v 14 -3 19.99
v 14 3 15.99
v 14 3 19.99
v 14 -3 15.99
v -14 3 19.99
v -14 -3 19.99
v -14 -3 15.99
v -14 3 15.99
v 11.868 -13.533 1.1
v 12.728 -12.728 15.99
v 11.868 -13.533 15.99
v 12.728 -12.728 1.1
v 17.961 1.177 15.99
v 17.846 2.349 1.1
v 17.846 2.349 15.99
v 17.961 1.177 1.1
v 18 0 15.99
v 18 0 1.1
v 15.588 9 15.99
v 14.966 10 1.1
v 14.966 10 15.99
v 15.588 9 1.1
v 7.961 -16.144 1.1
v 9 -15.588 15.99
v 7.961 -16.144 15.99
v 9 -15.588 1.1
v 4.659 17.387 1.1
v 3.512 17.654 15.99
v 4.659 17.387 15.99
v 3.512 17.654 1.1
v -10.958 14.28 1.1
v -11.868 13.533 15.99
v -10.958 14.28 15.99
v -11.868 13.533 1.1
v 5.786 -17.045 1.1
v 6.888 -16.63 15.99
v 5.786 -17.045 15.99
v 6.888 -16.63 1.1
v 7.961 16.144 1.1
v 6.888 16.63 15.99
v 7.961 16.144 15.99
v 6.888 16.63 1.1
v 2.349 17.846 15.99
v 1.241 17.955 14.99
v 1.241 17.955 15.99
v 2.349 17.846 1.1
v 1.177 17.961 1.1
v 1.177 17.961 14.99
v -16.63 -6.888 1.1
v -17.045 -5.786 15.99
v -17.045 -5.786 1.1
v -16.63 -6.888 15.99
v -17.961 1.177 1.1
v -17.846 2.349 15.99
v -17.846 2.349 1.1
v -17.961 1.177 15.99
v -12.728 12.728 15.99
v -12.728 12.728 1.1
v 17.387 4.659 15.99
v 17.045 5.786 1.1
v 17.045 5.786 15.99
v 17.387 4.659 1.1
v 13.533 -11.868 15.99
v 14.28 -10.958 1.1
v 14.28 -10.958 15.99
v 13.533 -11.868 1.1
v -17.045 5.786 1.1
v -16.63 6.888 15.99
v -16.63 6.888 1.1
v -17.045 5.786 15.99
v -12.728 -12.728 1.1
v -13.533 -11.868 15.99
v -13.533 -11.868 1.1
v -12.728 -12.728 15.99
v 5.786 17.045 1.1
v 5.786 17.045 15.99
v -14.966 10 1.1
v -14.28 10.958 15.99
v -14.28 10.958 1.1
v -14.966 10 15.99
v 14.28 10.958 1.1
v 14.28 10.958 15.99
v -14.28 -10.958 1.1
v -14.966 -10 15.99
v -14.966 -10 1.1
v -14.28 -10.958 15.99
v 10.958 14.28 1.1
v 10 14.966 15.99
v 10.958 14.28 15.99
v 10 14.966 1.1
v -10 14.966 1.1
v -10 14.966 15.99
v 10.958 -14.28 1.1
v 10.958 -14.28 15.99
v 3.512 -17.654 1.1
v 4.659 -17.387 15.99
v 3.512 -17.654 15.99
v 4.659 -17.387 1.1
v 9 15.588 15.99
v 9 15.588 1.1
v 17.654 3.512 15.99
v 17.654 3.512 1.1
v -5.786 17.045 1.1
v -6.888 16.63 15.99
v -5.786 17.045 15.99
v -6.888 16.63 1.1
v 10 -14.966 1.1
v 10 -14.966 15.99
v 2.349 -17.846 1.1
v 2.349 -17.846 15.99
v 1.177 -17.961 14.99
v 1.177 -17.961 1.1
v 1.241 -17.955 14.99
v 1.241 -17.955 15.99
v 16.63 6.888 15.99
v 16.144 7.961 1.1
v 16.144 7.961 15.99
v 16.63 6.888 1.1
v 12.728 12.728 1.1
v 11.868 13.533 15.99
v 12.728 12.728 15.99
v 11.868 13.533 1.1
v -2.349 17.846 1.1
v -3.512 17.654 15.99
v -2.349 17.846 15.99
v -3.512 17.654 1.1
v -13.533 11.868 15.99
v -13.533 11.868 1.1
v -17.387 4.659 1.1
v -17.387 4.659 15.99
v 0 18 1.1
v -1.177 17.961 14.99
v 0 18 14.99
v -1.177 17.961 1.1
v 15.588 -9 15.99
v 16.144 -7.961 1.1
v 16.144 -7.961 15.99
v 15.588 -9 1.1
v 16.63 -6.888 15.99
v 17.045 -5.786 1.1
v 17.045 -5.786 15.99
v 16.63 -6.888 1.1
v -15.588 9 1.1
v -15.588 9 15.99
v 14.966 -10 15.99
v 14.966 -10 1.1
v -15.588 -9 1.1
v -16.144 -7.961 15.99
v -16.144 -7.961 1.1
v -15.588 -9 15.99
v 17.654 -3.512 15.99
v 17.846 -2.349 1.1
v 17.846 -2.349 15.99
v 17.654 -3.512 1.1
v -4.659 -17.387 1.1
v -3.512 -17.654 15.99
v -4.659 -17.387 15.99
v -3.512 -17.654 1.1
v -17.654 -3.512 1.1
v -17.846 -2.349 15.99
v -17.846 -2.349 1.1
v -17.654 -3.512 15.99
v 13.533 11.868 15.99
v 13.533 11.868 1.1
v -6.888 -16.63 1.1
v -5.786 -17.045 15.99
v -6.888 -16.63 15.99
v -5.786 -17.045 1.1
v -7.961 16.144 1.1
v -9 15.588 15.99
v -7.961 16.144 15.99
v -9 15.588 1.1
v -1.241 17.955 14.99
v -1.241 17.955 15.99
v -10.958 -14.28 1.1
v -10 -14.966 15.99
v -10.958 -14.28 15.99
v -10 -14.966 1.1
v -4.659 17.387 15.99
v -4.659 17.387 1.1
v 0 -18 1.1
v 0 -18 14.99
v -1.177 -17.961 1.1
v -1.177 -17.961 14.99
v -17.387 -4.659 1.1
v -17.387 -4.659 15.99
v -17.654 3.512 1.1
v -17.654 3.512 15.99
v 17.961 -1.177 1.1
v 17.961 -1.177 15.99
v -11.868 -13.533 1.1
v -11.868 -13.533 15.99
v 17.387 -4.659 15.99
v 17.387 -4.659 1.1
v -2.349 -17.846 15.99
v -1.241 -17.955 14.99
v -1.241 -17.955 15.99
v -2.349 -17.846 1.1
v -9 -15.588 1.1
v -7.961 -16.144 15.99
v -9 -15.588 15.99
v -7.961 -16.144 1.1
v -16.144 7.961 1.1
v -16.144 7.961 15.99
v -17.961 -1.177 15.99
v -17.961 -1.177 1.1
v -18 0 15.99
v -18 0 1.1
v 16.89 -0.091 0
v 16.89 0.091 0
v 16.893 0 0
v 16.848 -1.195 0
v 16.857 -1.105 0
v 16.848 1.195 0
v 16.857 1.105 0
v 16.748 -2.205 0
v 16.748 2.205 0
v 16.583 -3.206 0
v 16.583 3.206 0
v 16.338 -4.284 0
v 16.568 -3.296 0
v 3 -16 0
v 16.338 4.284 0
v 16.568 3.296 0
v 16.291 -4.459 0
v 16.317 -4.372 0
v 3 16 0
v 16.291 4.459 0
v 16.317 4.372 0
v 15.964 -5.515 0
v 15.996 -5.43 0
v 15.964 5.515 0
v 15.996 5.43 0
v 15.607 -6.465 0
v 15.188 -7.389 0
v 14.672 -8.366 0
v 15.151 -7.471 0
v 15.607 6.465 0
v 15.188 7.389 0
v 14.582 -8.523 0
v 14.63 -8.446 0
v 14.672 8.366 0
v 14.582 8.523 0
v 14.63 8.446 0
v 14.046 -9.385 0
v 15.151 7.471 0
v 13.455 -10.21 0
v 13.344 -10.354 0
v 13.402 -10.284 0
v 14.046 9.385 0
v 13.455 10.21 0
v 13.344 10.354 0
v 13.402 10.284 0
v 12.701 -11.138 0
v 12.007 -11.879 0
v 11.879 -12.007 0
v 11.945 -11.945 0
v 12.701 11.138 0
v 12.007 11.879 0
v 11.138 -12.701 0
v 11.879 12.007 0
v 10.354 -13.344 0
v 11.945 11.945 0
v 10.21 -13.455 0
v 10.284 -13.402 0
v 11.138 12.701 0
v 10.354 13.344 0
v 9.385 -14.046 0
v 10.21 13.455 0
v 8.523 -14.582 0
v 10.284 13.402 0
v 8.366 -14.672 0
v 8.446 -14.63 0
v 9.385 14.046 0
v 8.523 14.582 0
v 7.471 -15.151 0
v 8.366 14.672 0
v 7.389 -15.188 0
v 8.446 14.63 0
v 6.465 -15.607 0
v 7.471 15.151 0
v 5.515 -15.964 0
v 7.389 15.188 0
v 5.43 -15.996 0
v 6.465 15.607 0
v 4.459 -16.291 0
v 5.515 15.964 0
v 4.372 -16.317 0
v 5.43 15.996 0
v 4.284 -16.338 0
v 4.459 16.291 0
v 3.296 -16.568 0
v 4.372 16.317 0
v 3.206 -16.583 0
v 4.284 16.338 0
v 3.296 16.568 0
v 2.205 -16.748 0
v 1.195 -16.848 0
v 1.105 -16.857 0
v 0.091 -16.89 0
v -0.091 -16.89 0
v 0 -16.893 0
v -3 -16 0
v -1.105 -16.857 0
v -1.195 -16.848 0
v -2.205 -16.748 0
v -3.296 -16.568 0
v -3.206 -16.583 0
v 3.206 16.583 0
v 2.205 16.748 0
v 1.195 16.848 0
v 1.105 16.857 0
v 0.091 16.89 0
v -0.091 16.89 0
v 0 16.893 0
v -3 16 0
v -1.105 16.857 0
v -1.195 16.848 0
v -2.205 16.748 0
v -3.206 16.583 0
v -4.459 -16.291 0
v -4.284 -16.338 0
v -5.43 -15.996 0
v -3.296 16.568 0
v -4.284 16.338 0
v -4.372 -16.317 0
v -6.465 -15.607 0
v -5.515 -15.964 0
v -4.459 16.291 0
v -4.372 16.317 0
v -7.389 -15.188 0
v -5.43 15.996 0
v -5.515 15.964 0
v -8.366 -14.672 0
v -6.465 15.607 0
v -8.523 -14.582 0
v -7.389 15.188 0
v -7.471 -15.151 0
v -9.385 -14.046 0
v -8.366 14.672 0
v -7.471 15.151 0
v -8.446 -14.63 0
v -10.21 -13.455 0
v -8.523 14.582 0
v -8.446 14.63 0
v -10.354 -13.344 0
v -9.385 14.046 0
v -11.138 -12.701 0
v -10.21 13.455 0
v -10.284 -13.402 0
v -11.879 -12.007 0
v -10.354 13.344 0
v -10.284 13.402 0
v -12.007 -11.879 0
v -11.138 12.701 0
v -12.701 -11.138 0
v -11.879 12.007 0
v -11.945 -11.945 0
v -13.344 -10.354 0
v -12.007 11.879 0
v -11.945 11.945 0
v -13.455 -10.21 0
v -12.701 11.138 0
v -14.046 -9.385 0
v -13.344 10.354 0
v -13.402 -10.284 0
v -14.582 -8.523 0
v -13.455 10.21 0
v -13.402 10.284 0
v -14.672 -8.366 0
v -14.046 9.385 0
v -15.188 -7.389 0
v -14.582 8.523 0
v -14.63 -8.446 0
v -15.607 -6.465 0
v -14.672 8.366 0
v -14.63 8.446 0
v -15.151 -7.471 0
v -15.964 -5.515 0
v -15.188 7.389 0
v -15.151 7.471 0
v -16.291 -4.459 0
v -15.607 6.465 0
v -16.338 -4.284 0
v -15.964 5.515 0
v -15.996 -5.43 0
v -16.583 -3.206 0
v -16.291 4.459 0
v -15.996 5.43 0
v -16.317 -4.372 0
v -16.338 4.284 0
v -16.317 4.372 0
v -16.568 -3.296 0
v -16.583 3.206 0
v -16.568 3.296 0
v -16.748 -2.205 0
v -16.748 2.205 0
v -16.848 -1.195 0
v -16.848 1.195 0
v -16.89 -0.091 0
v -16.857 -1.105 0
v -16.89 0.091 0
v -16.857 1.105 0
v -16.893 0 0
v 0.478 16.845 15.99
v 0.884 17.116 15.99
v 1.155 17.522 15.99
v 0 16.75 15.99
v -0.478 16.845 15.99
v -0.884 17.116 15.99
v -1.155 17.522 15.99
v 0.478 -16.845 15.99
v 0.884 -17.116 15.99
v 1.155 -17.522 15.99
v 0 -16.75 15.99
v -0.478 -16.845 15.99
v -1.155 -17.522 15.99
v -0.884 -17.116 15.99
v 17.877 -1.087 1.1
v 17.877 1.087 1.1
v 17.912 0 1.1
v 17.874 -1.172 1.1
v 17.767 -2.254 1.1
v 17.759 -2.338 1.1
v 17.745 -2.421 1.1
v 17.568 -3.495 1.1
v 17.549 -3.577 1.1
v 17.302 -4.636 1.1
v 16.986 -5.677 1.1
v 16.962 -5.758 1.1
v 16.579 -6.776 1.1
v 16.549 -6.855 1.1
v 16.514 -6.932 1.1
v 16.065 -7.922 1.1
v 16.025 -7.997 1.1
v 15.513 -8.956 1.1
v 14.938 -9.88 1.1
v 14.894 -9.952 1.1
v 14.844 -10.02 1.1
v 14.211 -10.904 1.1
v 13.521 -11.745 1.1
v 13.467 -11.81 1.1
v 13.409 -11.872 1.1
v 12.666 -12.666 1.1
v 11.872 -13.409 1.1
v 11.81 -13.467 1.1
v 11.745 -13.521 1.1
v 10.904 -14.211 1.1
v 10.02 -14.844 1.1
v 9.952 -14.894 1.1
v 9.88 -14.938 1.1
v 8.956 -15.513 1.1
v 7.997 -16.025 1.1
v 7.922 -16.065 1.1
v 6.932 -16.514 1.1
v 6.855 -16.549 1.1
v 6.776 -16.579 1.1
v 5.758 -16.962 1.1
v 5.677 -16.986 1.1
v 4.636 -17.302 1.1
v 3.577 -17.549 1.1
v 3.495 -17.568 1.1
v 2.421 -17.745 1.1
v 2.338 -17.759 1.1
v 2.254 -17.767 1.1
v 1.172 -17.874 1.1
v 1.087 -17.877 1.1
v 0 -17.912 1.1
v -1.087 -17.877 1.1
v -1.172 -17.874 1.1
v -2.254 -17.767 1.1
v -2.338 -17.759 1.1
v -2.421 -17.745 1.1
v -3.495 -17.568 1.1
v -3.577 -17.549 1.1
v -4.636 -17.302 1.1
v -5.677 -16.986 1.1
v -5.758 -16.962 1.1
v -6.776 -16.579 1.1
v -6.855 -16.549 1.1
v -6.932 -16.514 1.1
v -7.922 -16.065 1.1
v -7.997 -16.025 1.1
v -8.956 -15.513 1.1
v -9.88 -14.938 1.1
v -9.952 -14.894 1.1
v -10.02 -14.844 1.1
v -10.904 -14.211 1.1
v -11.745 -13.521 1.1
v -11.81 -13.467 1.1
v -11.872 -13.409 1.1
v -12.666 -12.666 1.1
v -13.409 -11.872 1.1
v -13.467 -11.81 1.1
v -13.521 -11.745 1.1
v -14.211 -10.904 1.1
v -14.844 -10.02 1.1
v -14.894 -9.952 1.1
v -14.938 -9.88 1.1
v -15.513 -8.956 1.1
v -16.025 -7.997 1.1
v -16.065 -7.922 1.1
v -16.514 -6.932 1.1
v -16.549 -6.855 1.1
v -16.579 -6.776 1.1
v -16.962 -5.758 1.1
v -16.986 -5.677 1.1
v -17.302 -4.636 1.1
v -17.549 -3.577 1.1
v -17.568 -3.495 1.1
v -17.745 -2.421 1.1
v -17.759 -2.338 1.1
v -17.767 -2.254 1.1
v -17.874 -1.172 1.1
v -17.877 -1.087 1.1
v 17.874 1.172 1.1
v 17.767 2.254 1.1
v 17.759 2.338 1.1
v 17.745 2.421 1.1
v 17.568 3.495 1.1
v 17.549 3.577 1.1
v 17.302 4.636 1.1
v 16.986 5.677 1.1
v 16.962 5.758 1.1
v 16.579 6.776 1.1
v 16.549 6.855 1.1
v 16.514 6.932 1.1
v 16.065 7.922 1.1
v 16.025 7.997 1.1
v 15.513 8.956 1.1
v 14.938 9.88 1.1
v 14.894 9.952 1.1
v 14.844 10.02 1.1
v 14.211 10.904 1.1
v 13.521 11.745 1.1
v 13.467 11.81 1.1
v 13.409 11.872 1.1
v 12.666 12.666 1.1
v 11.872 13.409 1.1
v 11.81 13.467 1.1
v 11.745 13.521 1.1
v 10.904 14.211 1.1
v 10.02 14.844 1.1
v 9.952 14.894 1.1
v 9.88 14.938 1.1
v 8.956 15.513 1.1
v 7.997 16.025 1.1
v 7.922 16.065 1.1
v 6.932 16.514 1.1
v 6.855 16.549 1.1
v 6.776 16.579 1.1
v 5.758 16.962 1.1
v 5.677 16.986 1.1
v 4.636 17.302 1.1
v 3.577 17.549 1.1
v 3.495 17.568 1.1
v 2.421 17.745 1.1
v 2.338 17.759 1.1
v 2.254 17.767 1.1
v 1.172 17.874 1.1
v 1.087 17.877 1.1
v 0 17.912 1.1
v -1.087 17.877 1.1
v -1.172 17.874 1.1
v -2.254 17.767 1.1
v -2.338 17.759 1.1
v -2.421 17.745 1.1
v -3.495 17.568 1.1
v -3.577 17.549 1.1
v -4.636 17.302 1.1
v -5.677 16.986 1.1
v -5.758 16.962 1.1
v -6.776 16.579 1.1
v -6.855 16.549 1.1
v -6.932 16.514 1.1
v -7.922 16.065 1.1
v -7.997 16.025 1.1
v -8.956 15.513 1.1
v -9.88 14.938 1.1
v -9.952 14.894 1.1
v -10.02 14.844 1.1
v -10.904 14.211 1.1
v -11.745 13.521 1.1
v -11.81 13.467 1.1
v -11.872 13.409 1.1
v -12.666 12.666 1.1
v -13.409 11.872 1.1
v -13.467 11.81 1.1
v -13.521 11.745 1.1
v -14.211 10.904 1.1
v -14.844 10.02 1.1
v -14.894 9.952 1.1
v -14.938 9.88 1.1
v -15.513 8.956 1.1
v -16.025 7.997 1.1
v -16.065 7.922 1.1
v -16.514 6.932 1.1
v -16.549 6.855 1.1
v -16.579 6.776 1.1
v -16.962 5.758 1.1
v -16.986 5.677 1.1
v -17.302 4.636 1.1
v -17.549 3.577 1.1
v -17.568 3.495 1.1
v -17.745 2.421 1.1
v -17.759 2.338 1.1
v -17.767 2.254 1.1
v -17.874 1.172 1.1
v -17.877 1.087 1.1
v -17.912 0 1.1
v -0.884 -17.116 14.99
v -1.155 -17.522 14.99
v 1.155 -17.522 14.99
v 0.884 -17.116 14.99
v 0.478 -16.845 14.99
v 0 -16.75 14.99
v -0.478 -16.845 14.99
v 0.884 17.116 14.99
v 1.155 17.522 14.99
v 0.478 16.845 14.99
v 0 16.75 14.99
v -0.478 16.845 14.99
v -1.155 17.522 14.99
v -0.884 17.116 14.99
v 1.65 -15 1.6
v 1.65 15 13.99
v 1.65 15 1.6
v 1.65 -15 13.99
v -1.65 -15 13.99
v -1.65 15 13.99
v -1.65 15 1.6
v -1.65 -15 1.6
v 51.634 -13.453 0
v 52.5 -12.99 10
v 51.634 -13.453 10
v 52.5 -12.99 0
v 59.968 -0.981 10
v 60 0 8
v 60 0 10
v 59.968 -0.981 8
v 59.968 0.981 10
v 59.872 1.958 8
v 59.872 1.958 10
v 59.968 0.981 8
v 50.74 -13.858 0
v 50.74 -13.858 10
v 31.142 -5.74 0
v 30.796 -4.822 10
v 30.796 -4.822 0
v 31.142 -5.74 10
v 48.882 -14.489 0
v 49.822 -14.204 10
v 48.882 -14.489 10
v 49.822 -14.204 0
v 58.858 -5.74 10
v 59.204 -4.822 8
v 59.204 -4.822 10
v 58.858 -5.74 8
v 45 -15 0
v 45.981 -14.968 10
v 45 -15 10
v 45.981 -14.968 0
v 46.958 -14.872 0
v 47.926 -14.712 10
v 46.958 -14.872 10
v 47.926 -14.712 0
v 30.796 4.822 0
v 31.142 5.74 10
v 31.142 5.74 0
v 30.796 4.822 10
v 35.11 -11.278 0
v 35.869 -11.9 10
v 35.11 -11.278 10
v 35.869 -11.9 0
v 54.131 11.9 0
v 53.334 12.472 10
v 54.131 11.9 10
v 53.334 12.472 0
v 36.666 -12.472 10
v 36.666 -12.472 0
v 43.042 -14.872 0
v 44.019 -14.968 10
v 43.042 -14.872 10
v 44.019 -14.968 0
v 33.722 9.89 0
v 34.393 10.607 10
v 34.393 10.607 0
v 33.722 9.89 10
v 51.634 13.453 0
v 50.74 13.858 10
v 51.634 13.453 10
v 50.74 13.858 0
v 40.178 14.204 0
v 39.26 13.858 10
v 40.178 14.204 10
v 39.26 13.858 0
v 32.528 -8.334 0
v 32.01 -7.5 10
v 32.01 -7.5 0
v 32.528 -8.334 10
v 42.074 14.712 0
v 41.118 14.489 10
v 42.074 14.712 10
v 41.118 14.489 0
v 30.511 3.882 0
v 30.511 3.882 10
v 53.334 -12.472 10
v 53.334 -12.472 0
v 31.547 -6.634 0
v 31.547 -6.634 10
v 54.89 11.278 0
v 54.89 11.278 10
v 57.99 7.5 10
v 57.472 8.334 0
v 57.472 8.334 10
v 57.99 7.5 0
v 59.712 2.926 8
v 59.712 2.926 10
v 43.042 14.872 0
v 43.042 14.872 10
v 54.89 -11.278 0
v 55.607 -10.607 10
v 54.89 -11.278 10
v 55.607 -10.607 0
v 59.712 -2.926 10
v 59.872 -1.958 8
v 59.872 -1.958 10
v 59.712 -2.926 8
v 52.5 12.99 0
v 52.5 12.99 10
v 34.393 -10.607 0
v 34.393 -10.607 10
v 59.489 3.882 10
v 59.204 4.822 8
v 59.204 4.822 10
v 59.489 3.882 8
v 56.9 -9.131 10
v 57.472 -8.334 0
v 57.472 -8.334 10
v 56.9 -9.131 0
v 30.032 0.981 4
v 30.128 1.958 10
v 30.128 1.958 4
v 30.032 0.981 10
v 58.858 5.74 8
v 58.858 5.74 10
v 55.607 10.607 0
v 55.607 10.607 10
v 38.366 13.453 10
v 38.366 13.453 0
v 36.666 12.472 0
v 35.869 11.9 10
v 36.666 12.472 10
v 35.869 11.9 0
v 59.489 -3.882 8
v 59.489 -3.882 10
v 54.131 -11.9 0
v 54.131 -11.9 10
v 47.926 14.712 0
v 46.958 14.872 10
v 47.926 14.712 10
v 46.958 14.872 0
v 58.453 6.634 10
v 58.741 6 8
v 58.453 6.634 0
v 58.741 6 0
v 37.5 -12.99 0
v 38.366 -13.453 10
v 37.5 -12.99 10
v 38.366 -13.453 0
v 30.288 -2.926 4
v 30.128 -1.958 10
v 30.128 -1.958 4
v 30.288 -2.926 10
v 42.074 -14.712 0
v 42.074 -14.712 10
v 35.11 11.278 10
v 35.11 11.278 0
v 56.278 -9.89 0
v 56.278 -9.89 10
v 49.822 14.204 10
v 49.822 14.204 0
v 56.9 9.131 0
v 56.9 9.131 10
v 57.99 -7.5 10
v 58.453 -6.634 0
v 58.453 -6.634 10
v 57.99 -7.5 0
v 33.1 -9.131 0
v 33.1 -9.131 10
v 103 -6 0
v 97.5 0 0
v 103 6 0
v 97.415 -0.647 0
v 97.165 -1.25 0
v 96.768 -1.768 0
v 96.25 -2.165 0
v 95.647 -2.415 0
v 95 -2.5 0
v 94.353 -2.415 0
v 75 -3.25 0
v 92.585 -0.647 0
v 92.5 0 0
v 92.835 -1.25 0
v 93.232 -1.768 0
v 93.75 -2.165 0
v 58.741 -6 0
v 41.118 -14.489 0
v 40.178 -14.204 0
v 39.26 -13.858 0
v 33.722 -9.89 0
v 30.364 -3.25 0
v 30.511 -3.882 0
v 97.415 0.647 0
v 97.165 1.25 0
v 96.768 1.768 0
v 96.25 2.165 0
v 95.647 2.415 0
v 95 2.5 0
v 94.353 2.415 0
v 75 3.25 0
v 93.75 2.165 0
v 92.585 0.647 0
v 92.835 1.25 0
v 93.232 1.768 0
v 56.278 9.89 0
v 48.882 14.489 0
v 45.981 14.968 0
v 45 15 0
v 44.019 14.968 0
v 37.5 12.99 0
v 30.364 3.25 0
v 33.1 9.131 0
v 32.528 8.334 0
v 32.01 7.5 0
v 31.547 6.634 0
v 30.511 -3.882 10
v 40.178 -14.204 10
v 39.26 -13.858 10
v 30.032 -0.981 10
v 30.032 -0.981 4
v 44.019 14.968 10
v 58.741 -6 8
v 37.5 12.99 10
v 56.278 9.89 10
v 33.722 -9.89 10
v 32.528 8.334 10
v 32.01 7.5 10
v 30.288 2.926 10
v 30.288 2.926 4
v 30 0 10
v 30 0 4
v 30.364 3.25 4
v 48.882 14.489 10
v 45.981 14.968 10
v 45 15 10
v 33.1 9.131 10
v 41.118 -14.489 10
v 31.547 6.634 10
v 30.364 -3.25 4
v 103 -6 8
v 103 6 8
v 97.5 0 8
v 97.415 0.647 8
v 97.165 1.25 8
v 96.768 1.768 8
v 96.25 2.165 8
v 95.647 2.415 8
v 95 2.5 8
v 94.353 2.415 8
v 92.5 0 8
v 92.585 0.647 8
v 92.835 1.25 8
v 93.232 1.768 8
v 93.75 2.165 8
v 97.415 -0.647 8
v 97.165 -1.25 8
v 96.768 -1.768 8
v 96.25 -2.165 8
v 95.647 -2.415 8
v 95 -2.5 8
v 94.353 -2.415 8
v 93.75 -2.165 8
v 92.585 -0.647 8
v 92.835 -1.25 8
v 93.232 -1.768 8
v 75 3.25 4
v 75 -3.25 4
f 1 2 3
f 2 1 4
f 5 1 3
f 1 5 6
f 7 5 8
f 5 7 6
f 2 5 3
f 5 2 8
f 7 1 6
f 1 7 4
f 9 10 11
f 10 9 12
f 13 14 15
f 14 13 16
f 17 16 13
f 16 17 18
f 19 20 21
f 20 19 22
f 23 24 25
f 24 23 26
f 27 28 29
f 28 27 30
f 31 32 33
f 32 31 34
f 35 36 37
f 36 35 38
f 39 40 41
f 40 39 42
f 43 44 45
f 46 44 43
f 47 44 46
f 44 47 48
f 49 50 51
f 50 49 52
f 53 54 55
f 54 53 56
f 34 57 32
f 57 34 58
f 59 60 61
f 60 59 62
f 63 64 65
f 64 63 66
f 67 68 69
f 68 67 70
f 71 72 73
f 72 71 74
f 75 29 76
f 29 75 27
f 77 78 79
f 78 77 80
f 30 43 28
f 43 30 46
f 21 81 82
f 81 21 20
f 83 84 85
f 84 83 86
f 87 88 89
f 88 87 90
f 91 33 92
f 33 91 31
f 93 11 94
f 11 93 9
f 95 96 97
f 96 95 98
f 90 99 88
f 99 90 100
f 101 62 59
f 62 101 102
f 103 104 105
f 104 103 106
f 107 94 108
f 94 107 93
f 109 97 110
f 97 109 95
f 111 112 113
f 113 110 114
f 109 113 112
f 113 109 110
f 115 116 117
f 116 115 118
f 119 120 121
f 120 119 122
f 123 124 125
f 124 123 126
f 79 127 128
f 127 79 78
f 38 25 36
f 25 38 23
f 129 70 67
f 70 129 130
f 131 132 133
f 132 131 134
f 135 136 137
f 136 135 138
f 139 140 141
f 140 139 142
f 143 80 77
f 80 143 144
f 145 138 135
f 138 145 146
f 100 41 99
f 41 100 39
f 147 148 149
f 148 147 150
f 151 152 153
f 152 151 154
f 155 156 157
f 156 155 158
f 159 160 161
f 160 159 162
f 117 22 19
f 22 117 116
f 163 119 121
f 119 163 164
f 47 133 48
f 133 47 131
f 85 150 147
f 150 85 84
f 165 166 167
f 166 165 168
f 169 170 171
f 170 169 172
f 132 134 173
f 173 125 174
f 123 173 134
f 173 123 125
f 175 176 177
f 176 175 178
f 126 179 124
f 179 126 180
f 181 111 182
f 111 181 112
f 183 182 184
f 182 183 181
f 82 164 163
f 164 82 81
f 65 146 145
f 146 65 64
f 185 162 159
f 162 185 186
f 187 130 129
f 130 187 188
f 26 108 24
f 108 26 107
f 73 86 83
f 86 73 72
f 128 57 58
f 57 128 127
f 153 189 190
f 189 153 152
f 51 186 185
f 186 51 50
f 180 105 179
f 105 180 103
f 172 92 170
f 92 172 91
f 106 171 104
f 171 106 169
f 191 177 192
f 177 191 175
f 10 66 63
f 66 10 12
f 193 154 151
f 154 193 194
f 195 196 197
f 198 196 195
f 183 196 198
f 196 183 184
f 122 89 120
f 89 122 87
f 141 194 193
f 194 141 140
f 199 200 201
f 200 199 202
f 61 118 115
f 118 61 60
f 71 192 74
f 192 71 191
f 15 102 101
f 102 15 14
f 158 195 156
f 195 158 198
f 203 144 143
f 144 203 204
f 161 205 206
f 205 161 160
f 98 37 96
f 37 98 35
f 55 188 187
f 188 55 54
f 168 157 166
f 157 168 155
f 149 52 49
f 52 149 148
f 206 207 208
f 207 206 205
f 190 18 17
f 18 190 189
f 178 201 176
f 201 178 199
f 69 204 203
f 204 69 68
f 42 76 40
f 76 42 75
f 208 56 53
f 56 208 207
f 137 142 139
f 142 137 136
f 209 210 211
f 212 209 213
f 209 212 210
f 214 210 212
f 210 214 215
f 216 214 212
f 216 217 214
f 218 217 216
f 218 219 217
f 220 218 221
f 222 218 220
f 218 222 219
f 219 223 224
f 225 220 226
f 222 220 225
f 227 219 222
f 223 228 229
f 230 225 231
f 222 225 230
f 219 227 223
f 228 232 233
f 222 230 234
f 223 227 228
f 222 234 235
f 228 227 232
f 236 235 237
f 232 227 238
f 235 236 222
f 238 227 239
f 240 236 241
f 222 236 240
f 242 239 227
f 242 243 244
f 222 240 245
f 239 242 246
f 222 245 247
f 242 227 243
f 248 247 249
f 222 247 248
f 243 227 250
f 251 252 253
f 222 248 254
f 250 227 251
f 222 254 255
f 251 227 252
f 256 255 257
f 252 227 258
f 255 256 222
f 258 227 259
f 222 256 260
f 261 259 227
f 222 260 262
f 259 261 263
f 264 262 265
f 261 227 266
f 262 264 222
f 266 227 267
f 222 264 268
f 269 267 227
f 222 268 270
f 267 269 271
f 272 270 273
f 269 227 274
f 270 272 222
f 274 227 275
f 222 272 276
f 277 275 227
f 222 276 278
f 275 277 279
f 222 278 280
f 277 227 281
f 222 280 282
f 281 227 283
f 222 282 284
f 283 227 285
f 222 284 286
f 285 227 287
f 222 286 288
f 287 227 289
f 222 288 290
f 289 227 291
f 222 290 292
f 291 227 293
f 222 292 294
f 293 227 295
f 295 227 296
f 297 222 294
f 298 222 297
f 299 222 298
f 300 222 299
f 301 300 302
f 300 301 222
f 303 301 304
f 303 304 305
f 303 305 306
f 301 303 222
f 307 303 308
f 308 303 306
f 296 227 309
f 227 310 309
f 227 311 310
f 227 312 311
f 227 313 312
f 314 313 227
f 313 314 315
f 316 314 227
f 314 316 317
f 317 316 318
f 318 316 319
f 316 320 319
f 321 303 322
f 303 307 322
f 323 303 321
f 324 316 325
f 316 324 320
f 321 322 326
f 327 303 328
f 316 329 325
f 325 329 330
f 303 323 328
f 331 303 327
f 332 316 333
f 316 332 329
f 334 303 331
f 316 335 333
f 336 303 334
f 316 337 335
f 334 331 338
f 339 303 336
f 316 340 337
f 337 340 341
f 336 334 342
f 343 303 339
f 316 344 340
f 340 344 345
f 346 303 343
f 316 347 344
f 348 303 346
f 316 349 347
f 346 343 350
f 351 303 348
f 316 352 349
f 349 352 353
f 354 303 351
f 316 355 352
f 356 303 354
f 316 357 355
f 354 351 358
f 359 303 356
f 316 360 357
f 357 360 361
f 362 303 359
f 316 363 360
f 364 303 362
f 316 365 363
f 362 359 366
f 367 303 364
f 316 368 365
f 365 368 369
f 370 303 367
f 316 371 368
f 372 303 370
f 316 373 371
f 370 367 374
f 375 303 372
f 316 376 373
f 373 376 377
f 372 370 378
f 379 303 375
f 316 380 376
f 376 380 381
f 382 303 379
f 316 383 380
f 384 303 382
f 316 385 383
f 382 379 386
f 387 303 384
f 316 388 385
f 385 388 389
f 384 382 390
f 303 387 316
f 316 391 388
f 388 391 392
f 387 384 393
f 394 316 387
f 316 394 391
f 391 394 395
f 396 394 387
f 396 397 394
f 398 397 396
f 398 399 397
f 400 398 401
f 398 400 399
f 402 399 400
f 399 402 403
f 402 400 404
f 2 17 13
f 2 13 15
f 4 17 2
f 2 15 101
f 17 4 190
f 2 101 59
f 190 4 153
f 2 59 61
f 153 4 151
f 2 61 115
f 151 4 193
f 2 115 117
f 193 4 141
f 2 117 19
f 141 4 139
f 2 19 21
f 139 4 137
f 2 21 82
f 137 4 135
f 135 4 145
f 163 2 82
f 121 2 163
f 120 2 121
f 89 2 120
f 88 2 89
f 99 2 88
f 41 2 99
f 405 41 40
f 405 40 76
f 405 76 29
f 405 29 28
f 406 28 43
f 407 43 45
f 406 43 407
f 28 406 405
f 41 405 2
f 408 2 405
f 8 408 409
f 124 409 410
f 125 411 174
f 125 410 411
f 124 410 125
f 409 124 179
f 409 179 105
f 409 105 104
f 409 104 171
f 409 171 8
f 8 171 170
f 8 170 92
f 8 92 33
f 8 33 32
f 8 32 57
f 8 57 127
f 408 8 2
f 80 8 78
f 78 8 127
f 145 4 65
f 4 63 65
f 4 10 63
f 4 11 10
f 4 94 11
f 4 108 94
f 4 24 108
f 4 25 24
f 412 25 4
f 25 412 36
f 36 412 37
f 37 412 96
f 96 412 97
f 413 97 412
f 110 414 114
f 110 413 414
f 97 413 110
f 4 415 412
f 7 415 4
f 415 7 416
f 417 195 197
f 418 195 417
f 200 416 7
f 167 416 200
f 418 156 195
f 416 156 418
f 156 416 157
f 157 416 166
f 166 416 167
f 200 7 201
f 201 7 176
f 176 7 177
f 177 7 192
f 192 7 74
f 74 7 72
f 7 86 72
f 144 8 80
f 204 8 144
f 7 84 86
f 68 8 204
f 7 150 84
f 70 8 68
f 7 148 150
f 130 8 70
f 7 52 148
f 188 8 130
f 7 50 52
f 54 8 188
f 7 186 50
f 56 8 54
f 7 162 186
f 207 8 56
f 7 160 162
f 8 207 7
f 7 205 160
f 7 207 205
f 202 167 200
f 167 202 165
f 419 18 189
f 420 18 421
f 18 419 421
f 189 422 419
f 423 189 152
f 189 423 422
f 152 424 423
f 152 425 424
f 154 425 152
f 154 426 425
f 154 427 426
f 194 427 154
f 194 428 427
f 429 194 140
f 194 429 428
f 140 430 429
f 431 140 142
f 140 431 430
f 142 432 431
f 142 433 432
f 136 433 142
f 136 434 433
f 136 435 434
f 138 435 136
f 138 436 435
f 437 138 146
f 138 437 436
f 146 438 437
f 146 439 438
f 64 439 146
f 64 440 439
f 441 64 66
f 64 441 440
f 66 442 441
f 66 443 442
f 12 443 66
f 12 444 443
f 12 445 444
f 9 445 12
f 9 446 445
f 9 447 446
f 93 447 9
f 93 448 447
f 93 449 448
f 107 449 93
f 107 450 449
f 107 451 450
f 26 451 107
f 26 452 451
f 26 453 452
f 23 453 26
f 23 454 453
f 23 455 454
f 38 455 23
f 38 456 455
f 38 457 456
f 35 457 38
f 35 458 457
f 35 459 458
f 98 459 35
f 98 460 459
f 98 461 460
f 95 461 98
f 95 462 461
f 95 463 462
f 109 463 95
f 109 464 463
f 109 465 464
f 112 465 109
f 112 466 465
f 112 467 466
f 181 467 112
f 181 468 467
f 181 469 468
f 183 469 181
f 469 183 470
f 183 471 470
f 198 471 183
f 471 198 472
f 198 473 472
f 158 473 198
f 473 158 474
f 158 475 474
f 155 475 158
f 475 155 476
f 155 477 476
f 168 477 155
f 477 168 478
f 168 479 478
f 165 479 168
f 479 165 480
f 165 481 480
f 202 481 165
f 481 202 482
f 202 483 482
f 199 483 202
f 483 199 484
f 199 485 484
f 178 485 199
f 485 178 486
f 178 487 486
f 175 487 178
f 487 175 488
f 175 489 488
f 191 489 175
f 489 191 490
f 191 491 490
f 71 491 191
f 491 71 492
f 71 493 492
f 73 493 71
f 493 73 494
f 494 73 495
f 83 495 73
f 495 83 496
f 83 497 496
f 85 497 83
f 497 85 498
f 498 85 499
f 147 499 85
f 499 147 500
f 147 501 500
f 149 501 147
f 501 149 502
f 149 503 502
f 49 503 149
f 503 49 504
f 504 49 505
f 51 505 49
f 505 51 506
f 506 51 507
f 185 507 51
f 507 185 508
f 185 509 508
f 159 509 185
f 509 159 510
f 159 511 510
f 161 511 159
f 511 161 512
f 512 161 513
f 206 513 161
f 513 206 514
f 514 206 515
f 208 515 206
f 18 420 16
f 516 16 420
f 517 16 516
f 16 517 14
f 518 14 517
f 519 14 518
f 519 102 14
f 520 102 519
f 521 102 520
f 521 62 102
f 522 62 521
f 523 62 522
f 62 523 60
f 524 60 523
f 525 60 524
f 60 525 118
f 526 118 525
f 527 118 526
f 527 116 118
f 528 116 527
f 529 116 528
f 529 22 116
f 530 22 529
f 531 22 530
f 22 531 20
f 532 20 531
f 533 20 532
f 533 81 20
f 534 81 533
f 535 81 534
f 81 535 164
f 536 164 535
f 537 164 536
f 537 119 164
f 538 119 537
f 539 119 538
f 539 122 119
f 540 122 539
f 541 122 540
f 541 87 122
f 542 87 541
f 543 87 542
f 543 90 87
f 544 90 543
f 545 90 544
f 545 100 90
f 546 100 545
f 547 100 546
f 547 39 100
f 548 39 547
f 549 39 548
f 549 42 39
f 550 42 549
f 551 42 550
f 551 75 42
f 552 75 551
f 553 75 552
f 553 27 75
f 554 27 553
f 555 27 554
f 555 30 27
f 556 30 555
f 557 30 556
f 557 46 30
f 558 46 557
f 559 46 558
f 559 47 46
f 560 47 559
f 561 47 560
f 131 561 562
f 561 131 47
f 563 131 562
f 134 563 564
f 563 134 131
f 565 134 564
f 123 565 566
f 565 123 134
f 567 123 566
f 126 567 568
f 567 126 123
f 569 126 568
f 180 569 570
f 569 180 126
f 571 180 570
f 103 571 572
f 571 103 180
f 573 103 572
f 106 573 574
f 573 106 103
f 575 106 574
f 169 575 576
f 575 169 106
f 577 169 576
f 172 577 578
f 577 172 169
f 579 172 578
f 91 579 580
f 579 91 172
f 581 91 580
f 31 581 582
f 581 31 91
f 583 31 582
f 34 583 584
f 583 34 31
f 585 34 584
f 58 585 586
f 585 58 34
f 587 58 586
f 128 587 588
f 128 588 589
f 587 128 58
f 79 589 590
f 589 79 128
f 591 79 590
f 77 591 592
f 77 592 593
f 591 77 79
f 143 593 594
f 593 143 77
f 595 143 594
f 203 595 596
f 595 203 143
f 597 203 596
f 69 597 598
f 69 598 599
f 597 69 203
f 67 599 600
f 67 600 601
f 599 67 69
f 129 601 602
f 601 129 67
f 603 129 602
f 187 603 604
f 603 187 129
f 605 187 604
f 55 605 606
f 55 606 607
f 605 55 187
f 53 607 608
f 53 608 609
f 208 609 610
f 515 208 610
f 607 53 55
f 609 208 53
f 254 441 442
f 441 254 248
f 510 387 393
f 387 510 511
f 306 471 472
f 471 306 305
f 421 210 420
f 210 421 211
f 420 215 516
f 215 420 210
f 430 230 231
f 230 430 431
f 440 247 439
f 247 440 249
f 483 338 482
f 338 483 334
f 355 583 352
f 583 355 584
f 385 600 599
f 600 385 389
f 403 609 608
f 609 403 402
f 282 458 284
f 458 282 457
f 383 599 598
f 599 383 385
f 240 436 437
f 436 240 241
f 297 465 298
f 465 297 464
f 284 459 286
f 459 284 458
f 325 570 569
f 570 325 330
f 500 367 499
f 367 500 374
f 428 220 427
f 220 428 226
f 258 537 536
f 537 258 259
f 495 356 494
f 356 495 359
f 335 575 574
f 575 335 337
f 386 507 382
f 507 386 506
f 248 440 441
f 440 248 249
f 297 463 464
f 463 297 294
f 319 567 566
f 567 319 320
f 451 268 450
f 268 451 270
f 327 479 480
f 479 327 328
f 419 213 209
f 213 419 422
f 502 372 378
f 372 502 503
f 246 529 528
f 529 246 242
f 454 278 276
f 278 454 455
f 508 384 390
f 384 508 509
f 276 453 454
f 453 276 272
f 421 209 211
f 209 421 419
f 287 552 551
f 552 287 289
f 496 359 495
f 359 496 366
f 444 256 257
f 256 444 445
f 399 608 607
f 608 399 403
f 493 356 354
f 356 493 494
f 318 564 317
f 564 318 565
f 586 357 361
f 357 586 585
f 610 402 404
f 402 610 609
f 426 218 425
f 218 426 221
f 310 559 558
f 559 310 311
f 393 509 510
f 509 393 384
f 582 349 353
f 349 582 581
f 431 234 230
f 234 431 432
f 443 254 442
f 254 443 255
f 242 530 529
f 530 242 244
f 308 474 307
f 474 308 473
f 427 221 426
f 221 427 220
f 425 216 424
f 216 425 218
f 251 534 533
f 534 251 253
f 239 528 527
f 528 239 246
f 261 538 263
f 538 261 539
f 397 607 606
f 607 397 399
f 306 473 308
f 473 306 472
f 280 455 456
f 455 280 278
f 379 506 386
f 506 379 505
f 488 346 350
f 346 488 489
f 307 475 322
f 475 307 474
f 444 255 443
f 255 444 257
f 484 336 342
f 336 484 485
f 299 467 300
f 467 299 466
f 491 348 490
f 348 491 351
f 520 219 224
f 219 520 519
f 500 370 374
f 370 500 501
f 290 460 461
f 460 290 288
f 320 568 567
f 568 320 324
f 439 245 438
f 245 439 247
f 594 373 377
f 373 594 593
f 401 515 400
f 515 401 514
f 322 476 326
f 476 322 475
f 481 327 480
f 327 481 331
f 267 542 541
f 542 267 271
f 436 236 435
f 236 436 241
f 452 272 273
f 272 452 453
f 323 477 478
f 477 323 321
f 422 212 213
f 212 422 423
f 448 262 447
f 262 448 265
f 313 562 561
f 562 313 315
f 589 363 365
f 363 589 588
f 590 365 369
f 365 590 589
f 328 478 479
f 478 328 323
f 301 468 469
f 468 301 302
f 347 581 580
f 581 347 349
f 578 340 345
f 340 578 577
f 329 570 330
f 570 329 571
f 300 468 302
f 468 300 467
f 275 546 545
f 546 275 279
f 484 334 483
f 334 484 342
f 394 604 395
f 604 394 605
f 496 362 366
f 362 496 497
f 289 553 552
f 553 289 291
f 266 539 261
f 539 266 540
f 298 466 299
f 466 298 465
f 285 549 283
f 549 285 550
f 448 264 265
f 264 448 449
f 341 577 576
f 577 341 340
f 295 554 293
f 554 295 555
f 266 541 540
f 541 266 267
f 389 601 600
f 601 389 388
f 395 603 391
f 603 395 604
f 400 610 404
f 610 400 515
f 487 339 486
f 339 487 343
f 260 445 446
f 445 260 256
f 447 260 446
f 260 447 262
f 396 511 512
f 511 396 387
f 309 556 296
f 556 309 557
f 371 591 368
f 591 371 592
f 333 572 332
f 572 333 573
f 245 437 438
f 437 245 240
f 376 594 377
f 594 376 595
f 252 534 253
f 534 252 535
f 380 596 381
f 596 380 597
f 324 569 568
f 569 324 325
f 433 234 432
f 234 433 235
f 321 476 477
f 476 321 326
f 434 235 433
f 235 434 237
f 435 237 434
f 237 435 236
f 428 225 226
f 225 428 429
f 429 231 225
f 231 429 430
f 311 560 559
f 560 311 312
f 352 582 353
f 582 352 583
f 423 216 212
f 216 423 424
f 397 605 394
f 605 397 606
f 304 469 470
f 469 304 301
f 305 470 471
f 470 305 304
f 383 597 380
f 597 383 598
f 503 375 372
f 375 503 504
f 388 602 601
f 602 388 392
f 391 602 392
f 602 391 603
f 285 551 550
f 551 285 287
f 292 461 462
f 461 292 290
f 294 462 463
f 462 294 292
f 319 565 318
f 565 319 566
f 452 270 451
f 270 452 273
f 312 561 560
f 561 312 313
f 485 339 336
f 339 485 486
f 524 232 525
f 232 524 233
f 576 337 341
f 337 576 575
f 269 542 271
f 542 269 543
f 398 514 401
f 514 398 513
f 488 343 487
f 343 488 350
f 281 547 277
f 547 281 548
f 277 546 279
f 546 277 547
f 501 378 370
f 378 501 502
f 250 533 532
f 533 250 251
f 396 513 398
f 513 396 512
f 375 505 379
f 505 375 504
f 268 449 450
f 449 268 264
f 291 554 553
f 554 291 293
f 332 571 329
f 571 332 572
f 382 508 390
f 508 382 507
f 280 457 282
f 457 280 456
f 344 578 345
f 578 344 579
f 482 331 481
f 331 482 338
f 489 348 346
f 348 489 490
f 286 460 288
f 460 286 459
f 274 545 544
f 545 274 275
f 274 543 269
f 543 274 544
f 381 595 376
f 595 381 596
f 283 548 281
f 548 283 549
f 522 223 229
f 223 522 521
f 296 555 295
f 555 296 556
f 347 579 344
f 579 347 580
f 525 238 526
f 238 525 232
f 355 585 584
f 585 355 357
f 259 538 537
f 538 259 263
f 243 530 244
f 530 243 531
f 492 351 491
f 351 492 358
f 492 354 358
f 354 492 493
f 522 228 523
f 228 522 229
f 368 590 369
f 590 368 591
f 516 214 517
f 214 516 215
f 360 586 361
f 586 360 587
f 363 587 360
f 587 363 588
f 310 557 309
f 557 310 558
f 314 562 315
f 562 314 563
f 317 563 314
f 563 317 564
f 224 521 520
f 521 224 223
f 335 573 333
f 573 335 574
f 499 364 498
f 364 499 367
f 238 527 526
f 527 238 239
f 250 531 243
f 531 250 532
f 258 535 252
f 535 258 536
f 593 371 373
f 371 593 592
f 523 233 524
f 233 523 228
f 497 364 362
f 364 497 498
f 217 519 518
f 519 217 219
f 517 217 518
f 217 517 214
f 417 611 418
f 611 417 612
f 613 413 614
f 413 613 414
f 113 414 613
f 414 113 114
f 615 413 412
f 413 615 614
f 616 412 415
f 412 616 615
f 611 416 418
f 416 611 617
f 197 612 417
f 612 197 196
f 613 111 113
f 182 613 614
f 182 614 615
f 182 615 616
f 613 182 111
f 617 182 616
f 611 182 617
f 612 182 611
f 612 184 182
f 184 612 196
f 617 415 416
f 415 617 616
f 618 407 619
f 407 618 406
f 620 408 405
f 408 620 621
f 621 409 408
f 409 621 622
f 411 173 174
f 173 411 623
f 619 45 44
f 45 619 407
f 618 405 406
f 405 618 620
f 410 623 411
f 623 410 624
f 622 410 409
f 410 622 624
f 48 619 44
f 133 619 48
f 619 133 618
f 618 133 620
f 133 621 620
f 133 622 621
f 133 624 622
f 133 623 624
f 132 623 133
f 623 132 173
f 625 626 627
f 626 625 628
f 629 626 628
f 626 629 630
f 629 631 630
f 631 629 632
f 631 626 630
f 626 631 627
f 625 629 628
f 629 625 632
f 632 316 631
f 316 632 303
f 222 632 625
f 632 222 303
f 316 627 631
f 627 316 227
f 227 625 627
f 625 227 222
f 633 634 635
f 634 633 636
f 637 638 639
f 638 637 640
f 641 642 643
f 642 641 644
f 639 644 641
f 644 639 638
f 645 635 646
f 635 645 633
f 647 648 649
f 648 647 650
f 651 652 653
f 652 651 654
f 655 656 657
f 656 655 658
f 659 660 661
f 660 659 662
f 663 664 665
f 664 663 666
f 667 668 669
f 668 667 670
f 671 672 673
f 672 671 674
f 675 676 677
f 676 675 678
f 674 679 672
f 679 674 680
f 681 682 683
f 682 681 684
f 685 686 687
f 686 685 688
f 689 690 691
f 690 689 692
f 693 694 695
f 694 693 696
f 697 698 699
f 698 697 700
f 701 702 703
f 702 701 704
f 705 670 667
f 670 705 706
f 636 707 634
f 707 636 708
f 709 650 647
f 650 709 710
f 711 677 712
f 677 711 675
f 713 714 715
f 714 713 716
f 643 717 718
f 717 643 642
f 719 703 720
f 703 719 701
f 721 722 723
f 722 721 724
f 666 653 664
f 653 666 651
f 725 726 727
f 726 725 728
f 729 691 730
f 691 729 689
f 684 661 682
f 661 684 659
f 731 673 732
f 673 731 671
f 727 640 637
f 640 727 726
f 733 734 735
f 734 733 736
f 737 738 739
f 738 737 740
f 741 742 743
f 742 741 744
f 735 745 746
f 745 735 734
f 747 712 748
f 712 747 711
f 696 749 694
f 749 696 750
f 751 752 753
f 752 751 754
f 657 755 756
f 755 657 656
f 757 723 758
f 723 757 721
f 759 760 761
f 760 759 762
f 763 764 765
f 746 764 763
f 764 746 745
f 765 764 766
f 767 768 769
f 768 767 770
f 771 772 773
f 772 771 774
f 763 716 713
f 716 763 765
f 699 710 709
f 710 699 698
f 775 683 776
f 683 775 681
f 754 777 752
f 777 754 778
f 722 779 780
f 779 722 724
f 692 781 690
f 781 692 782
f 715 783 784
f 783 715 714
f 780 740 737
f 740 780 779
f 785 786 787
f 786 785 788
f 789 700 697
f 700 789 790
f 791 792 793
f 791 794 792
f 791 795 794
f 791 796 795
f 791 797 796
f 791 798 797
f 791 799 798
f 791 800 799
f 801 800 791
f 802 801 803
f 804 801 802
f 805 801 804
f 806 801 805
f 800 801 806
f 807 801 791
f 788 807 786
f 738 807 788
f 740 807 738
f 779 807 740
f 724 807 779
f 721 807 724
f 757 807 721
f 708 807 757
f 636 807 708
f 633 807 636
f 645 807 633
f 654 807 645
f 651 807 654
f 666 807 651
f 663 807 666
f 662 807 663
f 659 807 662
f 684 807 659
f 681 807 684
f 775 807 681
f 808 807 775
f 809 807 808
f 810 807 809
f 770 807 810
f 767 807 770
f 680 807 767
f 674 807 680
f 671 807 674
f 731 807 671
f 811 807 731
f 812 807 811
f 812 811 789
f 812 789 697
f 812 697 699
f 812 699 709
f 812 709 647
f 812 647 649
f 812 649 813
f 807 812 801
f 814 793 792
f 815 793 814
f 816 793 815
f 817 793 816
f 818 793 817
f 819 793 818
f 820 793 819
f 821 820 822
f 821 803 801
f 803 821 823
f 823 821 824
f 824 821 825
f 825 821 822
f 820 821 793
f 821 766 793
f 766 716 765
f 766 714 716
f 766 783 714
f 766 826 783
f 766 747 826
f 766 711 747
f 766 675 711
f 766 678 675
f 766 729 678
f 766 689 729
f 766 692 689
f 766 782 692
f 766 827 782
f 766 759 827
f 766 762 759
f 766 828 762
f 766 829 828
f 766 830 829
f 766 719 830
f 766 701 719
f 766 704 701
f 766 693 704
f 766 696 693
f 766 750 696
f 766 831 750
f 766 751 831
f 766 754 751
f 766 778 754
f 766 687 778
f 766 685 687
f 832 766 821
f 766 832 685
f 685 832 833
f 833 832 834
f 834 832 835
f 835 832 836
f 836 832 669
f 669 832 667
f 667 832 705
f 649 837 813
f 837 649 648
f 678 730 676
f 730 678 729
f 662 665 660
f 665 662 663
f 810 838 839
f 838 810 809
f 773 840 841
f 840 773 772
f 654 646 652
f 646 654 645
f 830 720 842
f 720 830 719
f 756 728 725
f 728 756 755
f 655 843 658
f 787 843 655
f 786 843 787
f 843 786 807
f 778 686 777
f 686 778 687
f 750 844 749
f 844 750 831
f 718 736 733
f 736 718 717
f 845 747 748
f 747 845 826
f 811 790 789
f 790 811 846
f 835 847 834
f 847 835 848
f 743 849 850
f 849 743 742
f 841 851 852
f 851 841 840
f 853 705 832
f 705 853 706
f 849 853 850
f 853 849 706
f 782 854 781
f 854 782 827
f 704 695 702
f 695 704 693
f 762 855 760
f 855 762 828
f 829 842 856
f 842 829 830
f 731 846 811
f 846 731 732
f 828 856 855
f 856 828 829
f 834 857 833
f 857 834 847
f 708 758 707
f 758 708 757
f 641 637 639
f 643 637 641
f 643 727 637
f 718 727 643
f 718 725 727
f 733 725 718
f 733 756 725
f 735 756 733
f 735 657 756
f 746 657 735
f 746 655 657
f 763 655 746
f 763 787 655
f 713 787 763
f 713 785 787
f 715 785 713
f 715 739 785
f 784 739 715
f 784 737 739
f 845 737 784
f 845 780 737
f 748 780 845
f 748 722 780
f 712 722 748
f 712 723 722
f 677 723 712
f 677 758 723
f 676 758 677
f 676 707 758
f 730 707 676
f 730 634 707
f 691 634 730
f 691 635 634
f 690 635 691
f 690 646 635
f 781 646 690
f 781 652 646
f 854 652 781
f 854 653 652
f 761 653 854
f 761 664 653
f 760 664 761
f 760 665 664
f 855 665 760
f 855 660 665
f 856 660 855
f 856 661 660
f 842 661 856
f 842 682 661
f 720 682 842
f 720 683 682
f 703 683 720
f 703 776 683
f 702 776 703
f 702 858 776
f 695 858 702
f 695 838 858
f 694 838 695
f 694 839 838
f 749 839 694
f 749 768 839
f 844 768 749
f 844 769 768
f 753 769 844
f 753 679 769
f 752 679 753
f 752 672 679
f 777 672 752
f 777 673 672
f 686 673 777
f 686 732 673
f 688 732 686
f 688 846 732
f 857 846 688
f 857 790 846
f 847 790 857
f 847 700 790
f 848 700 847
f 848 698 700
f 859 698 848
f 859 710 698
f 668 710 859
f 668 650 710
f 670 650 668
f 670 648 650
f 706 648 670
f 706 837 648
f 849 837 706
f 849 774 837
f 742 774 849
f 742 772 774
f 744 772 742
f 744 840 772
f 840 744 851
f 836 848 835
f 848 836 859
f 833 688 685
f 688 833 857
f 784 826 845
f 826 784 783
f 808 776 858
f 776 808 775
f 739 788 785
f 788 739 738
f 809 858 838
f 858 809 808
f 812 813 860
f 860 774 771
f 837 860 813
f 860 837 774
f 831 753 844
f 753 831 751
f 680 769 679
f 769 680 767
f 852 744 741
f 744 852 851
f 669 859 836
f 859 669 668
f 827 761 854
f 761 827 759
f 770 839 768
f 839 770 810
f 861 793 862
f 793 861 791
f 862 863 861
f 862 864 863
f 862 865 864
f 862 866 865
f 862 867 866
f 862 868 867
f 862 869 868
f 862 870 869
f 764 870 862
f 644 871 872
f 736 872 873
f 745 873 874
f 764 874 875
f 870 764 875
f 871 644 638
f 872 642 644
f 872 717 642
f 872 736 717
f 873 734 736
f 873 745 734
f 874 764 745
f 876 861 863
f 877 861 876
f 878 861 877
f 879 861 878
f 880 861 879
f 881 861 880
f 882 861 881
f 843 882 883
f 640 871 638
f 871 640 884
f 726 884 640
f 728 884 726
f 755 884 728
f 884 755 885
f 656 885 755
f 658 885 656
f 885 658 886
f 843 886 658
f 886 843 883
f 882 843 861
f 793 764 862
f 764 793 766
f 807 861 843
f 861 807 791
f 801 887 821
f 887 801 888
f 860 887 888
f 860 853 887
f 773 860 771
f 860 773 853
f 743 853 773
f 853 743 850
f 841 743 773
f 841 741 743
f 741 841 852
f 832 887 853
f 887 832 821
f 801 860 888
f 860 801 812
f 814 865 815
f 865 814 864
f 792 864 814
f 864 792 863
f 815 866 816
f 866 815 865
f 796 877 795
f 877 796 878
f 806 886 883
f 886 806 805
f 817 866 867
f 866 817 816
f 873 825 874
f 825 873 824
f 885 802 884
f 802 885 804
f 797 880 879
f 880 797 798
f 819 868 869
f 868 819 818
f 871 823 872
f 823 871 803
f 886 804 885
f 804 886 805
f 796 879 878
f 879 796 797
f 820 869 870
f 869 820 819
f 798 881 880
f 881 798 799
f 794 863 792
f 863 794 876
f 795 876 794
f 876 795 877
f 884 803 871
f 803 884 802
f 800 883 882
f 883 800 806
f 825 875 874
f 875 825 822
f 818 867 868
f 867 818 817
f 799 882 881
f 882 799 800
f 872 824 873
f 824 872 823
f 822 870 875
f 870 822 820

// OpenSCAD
// FIRST key-turner print: the cap (mouth down) + a hand lever that engages its
// tongue like the motor hub does. Try it on the real key; hook a luggage scale
// in the lever hole (50mm from the axis) to measure the key's turning torque.
use <key_turner_housing.scad>
print_cap();
translate([45, 0, 0]) print_fit_lever();
